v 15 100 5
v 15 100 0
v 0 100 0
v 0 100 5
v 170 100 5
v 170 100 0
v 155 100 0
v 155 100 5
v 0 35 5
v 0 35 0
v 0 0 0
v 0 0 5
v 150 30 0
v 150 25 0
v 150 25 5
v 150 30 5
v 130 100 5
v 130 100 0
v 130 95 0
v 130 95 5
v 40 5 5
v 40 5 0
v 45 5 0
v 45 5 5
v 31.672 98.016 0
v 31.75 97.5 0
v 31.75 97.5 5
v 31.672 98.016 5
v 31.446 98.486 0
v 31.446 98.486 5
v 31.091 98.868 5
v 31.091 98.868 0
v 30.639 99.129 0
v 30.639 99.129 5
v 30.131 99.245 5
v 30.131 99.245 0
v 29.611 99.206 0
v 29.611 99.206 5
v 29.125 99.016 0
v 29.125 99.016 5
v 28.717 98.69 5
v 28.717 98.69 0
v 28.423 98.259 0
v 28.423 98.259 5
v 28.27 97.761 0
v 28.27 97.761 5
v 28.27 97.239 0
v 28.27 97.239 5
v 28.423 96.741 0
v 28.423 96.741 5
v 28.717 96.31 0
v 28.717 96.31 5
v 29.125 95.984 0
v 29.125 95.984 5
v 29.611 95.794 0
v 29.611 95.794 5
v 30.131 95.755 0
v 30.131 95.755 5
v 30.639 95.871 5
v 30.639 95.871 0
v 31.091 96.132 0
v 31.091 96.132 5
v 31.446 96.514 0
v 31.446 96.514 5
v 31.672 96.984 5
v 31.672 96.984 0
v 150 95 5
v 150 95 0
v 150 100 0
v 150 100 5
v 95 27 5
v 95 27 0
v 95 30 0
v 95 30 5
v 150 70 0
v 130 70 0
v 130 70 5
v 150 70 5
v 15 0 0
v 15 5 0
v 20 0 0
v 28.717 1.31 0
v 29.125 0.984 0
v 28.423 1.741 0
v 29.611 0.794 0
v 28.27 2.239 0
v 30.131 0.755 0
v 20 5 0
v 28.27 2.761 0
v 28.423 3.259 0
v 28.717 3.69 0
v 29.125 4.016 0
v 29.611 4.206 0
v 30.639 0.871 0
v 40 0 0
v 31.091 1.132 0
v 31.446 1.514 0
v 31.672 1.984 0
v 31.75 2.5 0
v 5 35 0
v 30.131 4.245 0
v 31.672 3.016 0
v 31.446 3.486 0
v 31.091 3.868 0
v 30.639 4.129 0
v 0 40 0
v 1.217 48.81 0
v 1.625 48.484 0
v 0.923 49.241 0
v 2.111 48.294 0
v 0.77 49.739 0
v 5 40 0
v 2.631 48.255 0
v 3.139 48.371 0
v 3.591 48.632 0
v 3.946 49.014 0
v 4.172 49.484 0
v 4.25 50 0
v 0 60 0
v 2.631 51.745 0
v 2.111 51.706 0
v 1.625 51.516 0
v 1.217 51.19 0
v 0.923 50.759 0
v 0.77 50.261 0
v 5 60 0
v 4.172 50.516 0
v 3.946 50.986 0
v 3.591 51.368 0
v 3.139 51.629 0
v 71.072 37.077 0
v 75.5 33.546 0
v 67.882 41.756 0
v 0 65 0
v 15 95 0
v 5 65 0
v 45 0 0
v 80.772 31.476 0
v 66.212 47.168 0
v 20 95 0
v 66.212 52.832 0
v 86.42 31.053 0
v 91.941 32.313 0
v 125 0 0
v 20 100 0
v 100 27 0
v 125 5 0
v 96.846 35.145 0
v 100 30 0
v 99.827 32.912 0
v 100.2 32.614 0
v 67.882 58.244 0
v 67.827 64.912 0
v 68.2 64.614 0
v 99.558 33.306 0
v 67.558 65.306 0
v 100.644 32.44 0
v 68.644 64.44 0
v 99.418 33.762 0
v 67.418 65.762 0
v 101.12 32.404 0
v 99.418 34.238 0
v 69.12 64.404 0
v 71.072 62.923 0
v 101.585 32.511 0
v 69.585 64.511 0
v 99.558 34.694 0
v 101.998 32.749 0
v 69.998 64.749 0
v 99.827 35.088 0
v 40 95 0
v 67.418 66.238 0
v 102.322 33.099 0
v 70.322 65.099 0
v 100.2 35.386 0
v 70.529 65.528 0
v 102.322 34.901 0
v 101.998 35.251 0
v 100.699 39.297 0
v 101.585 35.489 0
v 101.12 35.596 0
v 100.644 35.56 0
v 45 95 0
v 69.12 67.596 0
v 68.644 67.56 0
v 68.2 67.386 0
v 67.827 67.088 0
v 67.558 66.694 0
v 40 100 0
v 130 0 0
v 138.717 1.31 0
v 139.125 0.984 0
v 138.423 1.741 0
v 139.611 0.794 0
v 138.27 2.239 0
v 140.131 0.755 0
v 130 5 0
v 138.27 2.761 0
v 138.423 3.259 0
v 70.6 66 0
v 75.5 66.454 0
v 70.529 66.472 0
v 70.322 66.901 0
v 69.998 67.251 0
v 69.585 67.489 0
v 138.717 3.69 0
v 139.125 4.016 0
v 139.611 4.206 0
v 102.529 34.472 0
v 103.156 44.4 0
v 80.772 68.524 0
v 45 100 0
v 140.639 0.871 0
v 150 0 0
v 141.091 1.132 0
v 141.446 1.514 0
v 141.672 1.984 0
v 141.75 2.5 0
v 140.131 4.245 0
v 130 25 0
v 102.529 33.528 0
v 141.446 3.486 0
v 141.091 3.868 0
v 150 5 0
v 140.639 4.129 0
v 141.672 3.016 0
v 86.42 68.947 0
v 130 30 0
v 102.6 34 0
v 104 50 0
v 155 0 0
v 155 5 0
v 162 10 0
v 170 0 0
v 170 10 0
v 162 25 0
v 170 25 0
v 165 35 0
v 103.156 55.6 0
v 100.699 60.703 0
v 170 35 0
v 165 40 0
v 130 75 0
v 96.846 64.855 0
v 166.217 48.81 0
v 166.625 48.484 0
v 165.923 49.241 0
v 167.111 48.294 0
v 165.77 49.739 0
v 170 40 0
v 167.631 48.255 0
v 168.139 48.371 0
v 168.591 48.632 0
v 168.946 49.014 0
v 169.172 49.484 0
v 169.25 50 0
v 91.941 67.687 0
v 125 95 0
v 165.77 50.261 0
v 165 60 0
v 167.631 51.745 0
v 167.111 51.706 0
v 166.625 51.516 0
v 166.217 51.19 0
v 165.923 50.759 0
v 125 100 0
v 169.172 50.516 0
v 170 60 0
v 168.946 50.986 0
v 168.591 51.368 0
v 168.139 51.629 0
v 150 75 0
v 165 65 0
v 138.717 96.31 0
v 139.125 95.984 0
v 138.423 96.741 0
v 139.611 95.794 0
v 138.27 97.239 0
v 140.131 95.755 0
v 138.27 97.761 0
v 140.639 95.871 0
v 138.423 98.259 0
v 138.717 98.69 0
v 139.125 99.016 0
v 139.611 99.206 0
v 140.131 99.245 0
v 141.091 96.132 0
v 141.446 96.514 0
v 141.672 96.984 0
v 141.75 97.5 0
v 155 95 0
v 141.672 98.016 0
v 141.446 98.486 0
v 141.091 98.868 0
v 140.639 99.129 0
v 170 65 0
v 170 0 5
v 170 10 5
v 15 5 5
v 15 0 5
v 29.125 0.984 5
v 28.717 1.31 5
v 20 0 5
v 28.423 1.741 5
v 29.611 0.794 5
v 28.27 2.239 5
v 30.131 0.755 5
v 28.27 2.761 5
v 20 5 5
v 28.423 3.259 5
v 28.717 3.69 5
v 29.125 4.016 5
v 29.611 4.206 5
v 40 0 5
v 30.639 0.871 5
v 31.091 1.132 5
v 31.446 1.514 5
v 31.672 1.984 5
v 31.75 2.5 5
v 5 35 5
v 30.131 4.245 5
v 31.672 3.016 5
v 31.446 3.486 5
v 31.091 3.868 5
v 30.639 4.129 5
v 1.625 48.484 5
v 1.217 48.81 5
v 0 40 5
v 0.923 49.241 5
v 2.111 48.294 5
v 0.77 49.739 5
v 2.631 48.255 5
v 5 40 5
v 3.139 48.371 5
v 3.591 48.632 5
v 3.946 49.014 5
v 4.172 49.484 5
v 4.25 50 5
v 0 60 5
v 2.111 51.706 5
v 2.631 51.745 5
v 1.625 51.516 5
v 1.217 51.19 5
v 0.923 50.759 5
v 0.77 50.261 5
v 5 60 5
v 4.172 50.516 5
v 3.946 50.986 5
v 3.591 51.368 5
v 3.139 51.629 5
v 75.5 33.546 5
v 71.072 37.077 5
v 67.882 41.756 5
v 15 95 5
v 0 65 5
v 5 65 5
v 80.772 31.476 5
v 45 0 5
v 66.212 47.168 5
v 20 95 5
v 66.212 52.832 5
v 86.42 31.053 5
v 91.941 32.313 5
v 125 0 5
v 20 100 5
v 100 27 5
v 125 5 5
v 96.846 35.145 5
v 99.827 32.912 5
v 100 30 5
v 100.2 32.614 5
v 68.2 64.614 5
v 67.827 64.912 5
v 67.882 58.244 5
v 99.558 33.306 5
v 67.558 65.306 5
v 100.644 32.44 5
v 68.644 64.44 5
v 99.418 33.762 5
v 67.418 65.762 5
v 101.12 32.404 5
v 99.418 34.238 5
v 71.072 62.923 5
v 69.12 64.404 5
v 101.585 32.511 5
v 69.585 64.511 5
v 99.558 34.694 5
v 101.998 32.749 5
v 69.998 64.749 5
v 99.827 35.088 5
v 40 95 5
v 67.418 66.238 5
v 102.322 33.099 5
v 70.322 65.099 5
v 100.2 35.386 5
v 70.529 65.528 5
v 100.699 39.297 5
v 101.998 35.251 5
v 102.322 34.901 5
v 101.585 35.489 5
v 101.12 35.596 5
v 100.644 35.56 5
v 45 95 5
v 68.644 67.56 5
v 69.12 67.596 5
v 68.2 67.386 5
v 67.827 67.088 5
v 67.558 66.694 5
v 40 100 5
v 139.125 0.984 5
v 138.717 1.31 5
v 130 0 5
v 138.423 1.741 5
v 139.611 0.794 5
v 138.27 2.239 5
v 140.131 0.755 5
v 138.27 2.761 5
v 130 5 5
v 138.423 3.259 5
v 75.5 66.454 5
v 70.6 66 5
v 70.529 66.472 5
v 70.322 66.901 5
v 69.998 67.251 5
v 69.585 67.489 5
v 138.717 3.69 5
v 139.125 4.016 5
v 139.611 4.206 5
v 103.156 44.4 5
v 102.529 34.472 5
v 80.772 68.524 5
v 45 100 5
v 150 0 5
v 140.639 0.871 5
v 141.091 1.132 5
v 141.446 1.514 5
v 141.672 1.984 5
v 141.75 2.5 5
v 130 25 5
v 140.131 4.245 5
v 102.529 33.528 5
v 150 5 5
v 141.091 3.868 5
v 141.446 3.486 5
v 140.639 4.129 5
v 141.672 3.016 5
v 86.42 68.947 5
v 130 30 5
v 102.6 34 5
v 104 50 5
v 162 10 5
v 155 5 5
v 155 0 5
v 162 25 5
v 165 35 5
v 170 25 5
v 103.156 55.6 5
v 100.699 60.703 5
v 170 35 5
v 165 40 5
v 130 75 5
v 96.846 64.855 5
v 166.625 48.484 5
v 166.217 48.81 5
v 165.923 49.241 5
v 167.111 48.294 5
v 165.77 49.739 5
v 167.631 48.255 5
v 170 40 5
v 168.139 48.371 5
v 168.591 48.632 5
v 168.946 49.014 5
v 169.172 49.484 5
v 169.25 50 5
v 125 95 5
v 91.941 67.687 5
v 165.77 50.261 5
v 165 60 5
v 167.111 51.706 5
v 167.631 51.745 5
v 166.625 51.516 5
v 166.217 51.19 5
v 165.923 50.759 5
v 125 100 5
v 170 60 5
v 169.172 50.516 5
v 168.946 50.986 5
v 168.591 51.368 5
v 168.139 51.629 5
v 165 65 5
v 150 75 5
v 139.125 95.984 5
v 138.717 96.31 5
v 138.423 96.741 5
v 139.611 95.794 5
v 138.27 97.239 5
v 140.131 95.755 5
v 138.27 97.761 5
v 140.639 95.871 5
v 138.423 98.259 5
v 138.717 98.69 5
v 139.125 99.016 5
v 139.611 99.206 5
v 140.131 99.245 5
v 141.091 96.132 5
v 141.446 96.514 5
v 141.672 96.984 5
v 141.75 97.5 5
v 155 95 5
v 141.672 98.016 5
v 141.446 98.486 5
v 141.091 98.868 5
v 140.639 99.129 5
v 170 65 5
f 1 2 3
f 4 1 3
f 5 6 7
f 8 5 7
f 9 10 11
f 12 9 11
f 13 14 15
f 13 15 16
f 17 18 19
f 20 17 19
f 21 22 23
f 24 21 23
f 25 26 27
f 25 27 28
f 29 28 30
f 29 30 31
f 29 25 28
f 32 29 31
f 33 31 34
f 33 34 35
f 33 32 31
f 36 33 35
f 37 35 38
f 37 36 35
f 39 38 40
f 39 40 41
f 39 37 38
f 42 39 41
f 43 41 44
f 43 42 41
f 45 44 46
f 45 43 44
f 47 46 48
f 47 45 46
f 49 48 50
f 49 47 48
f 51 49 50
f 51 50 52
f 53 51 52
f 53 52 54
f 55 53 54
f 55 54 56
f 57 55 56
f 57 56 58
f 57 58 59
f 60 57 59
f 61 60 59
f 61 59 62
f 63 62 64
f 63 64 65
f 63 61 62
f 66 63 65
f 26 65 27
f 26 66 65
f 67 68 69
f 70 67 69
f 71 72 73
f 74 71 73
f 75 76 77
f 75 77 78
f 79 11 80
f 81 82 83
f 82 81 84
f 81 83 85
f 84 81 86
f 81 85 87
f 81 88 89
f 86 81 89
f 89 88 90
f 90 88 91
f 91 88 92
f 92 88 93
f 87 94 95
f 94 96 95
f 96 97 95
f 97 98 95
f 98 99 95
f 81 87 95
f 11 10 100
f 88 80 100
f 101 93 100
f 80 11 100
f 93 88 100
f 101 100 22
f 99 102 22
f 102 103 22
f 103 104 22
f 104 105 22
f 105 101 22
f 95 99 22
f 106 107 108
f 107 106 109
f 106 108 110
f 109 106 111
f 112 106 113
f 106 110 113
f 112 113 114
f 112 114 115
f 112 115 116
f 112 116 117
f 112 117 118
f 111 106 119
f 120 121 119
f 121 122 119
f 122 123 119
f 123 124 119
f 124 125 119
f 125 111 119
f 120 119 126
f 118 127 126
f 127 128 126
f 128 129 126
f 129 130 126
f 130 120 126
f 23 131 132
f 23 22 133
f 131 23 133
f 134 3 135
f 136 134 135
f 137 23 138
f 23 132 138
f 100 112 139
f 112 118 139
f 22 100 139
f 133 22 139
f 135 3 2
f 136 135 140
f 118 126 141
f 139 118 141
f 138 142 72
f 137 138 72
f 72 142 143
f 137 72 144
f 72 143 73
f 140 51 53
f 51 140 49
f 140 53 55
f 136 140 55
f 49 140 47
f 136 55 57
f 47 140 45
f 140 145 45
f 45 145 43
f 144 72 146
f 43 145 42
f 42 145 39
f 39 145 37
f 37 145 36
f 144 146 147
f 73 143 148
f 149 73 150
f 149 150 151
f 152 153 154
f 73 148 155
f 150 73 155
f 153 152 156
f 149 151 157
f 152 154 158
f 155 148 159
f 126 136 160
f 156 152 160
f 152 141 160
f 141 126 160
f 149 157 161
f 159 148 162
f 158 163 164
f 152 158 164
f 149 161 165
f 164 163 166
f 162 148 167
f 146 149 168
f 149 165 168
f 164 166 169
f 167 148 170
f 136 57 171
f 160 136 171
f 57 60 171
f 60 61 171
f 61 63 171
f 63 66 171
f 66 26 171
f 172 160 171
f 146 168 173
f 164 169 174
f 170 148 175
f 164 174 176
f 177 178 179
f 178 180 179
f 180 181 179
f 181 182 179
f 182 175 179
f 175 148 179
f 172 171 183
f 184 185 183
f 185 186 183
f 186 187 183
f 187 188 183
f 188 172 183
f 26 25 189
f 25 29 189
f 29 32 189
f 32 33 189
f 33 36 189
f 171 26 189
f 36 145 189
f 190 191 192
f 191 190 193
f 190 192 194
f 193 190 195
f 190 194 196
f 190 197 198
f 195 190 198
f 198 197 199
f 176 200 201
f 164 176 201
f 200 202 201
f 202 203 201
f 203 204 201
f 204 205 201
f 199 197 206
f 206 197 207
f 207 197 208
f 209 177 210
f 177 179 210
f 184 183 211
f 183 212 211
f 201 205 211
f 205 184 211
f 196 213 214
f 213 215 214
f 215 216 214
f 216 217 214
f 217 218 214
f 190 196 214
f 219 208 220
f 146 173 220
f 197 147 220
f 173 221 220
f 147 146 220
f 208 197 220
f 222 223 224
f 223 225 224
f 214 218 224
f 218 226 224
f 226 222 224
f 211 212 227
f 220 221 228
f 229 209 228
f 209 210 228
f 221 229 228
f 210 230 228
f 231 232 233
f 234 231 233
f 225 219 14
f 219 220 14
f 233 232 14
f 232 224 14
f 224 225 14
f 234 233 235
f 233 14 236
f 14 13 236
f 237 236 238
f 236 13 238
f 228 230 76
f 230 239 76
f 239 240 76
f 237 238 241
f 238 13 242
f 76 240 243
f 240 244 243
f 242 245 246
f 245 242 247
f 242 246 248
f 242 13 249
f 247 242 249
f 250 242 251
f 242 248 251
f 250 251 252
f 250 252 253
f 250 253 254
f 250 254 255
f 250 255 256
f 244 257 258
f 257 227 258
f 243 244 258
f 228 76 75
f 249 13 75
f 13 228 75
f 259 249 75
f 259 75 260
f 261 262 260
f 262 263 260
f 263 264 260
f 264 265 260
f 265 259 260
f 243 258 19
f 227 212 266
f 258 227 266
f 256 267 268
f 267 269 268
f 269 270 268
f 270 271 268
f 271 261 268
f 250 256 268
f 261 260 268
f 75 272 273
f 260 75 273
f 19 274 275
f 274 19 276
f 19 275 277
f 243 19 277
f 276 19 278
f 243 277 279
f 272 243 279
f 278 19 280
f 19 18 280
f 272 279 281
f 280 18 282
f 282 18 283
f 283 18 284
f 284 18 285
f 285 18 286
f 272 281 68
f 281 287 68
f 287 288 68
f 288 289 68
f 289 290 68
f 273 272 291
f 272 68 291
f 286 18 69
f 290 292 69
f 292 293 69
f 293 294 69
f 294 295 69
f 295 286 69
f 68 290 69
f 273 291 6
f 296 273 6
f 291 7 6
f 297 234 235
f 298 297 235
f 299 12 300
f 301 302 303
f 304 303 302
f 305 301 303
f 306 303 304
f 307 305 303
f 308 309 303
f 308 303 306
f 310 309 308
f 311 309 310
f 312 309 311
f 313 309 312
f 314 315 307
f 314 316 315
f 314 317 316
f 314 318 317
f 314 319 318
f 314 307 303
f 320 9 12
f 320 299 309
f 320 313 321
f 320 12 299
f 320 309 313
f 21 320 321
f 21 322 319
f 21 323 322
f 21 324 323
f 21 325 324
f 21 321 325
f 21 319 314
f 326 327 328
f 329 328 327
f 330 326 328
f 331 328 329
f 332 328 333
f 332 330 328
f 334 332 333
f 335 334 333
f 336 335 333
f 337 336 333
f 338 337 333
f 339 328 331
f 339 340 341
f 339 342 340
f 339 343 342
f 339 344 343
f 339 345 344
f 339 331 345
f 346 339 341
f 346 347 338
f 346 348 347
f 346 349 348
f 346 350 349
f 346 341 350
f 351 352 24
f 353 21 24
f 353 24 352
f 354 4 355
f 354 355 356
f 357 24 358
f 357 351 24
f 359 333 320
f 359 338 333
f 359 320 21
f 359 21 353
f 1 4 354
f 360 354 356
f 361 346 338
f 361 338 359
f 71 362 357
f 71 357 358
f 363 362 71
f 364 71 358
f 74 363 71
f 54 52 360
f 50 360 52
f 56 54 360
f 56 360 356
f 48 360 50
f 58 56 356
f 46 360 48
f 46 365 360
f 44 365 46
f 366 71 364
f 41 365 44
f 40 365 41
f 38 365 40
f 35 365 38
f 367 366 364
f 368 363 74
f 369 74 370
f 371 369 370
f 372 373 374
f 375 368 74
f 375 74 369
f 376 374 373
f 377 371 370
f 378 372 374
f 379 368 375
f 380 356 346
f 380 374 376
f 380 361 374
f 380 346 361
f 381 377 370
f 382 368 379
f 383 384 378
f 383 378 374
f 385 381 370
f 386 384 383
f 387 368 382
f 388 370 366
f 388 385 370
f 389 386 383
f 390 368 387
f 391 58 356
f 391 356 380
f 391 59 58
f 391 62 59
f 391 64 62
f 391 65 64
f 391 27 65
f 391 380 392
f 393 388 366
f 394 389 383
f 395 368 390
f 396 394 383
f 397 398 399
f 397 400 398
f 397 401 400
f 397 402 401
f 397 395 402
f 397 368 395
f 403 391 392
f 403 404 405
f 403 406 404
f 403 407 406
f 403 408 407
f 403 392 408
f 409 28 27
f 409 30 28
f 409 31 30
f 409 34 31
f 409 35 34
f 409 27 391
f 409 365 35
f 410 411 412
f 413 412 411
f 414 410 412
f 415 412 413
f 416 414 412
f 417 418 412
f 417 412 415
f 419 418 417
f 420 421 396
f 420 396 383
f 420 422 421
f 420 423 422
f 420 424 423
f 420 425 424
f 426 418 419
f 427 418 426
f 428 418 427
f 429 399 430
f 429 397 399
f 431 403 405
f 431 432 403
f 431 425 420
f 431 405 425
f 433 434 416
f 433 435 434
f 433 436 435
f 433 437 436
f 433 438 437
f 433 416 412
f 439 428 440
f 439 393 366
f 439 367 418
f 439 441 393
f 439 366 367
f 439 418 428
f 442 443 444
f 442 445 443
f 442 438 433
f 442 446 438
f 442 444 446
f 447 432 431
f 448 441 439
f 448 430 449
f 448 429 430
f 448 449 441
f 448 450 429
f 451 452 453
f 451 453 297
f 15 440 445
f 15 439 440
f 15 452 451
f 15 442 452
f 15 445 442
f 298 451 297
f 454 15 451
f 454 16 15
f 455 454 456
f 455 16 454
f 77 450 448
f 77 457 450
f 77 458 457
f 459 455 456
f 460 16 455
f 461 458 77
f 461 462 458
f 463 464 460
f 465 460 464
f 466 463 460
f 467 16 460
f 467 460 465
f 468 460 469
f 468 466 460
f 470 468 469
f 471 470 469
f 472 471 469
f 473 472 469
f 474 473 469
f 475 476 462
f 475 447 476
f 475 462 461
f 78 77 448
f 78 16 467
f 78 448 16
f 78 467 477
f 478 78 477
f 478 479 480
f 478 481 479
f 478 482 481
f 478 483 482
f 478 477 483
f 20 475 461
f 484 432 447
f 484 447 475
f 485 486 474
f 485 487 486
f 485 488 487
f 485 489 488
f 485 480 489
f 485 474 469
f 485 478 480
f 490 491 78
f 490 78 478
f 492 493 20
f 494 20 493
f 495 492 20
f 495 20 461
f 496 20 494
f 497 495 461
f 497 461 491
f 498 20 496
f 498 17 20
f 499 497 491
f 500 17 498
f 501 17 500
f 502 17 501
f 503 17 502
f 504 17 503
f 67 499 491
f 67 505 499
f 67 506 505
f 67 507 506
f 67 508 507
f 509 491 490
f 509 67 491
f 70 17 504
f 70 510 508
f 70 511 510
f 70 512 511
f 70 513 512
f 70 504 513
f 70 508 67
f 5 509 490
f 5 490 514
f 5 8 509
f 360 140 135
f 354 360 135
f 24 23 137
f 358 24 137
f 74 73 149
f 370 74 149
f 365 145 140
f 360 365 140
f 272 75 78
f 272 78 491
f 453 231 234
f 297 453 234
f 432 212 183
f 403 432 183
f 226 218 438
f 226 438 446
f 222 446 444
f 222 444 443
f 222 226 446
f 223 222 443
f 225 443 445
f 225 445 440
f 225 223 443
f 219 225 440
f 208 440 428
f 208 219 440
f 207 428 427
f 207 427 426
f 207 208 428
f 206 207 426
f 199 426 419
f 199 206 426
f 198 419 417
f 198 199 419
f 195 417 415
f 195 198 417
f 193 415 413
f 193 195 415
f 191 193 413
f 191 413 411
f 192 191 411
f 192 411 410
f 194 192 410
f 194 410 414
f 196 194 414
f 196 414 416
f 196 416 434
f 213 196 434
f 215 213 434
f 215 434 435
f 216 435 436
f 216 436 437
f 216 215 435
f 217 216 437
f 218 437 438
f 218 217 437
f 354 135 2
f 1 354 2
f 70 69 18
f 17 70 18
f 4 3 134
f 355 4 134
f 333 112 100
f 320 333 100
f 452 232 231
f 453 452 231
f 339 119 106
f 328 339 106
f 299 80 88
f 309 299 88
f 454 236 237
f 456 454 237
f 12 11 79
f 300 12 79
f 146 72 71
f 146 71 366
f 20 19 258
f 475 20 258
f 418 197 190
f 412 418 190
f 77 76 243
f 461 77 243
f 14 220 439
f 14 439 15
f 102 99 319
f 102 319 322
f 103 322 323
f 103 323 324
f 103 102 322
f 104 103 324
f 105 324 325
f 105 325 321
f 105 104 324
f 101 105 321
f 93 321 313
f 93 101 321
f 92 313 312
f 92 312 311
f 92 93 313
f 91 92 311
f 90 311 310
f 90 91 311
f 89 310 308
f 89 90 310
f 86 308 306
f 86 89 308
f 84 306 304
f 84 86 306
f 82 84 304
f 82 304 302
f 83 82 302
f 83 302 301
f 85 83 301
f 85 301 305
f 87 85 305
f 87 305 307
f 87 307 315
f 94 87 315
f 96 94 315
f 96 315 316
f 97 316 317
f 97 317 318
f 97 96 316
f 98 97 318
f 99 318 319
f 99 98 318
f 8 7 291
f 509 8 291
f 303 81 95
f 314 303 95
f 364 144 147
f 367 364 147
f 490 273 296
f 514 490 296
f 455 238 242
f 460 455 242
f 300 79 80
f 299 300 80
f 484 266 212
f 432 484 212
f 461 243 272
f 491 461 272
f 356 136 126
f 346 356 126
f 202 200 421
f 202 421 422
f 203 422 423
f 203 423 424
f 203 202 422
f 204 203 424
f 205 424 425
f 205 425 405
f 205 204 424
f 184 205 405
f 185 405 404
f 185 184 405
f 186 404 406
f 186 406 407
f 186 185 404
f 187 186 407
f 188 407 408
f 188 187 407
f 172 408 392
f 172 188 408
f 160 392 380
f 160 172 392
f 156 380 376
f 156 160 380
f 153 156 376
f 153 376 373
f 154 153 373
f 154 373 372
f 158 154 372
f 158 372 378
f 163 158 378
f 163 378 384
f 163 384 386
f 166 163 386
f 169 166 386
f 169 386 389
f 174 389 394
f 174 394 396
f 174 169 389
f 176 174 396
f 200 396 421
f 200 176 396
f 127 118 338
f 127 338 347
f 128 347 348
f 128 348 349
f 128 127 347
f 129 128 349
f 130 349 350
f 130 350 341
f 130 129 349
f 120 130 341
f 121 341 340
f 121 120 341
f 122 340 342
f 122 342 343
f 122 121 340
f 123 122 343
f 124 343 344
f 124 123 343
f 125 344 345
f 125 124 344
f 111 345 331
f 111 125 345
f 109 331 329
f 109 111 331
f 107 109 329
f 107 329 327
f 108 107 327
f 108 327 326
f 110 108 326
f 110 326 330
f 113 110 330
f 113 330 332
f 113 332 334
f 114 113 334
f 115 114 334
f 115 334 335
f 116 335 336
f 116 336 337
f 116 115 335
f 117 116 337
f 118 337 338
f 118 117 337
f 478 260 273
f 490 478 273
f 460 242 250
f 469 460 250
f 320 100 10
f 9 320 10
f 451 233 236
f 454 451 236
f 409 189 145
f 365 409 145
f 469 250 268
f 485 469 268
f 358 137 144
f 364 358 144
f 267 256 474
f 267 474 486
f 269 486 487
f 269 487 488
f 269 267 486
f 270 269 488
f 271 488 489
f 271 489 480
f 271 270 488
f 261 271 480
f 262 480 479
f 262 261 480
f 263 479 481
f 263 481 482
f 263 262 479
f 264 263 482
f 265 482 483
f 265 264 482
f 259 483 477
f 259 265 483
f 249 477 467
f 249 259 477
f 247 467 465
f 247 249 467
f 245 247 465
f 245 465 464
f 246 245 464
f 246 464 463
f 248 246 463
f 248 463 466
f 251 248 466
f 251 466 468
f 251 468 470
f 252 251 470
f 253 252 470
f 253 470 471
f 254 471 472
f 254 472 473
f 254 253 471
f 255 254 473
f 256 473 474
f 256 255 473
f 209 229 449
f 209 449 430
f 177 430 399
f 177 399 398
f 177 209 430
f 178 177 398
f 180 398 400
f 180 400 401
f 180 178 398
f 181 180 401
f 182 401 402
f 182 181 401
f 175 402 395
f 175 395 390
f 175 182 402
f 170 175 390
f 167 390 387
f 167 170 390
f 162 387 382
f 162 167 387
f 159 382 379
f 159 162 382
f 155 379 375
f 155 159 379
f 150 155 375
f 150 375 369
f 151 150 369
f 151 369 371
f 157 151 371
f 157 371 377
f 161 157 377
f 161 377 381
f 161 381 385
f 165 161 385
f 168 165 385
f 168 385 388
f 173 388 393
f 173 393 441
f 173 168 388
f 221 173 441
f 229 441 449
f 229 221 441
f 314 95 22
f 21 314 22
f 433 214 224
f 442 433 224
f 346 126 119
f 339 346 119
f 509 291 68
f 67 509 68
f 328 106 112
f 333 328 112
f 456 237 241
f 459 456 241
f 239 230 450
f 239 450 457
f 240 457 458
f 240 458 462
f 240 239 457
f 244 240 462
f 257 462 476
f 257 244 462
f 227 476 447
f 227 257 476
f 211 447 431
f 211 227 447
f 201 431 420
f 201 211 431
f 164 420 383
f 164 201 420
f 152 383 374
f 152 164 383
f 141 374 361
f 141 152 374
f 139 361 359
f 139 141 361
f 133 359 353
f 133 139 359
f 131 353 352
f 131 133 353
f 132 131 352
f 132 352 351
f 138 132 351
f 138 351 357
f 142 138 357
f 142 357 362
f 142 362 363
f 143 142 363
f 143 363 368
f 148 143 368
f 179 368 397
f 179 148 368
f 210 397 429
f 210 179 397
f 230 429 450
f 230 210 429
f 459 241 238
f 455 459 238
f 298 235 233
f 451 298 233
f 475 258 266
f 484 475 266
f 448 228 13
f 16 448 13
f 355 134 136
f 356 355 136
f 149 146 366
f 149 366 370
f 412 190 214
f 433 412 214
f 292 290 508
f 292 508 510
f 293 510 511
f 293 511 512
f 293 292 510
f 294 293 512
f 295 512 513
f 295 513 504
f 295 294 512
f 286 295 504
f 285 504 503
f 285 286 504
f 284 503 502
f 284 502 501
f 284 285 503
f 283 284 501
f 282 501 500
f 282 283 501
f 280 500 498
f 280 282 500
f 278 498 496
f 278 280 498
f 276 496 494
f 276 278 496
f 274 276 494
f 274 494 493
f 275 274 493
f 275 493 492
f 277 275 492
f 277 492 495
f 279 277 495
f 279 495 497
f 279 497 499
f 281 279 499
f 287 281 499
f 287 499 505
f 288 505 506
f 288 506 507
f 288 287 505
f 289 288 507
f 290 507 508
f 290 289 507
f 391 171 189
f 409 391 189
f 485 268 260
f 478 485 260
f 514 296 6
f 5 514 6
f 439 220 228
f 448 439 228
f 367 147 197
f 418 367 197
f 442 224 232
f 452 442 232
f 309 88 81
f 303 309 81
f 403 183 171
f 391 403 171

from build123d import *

# Parameters (mm, degrees)
F0_R     = 1.75
F0_W     = 5
F0_H     = 3
F0_R_2   = 1.6
F0_W_2   = 20
F0_H_2   = 5
F0_R_3   = 19
F1_DEPTH = 5


with BuildPart() as f1:
    # F0 (on Top) → F1 (new body)
    with BuildSketch(Plane.XY):
        Polygon((15, 100), (0, 100), (0, 65), (5, 65), (5, 60), (0, 60), (0, 40), (5, 40), (5, 35), (0, 35), (0, 0), (15, 0), (15, 5), (20, 5), (20, 0), (40, 0), (40, 5), (45, 5), (45, 0), (125, 0), (125, 5), (130, 5), (130, 0), (150, 0), (150, 5), (155, 5), (155, 0), (170, 0), (170, 10), (162, 10), (162, 25), (170, 25), (170, 35), (165, 35), (165, 40), (170, 40), (170, 60), (165, 60), (165, 65), (170, 65), (170, 100), (155, 100), (155, 95), (150, 95), (150, 100), (130, 100), (130, 95), (125, 95), (125, 100), (45, 100), (45, 95), (40, 95), (40, 100), (20, 100), (20, 95), (15, 95), align=None)
        with Locations((30, 2.5)):
            Circle(F0_R, mode=Mode.SUBTRACT)
        with Locations((140, 2.5)):
            Circle(F0_R, mode=Mode.SUBTRACT)
        with Locations((97.5, 28.5)):
            Rectangle(F0_W, F0_H, mode=Mode.SUBTRACT)
        with Locations((101, 34)):
            Circle(F0_R_2, mode=Mode.SUBTRACT)
        with Locations((140, 27.5)):
            Rectangle(F0_W_2, F0_H_2, mode=Mode.SUBTRACT)
        with Locations((2.5, 50)):
            Circle(F0_R, mode=Mode.SUBTRACT)
        with Locations((69, 66)):
            Circle(F0_R_2, mode=Mode.SUBTRACT)
        with Locations((30, 97.5)):
            Circle(F0_R, mode=Mode.SUBTRACT)
        with Locations((85, 50)):
            Circle(F0_R_3, mode=Mode.SUBTRACT)
        with Locations((167.5, 50)):
            Circle(F0_R, mode=Mode.SUBTRACT)
        with Locations((140, 72.5)):
            Rectangle(F0_W_2, F0_H_2, mode=Mode.SUBTRACT)
        with Locations((140, 97.5)):
            Circle(F0_R, mode=Mode.SUBTRACT)
    extrude(amount=F1_DEPTH)


solid = f1.part
